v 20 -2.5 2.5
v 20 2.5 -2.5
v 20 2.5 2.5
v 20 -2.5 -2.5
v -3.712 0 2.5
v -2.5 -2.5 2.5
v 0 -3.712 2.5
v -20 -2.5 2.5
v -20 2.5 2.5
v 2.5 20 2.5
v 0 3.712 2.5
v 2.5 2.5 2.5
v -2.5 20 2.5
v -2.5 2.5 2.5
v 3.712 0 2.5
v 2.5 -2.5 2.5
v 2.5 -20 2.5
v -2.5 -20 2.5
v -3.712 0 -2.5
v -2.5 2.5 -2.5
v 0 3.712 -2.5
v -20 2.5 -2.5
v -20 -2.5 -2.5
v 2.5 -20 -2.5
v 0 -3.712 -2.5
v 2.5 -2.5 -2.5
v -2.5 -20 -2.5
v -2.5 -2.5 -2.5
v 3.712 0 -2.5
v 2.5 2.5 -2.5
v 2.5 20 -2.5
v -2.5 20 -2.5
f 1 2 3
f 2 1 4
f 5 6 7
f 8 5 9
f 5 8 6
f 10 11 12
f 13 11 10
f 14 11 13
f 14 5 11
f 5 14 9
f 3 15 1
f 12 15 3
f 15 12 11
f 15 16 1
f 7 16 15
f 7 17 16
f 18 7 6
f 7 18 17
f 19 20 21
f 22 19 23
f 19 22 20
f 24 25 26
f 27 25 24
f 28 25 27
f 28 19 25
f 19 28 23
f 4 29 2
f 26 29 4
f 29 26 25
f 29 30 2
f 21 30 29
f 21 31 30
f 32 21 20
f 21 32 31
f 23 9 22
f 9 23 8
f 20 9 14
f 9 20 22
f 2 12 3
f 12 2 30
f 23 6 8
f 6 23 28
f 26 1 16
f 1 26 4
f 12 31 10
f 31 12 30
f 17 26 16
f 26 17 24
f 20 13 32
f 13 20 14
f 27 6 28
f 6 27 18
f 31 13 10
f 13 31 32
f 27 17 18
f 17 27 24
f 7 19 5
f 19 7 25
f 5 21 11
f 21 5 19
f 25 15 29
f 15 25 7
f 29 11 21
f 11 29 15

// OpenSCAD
difference() {
    union() {
        cube([40, 5, 5], true);
        cube([5, 40, 5], true);
    }
    rotate([0, 0, 45]) cube([5.25, 5.25, 5.25], true);
}
